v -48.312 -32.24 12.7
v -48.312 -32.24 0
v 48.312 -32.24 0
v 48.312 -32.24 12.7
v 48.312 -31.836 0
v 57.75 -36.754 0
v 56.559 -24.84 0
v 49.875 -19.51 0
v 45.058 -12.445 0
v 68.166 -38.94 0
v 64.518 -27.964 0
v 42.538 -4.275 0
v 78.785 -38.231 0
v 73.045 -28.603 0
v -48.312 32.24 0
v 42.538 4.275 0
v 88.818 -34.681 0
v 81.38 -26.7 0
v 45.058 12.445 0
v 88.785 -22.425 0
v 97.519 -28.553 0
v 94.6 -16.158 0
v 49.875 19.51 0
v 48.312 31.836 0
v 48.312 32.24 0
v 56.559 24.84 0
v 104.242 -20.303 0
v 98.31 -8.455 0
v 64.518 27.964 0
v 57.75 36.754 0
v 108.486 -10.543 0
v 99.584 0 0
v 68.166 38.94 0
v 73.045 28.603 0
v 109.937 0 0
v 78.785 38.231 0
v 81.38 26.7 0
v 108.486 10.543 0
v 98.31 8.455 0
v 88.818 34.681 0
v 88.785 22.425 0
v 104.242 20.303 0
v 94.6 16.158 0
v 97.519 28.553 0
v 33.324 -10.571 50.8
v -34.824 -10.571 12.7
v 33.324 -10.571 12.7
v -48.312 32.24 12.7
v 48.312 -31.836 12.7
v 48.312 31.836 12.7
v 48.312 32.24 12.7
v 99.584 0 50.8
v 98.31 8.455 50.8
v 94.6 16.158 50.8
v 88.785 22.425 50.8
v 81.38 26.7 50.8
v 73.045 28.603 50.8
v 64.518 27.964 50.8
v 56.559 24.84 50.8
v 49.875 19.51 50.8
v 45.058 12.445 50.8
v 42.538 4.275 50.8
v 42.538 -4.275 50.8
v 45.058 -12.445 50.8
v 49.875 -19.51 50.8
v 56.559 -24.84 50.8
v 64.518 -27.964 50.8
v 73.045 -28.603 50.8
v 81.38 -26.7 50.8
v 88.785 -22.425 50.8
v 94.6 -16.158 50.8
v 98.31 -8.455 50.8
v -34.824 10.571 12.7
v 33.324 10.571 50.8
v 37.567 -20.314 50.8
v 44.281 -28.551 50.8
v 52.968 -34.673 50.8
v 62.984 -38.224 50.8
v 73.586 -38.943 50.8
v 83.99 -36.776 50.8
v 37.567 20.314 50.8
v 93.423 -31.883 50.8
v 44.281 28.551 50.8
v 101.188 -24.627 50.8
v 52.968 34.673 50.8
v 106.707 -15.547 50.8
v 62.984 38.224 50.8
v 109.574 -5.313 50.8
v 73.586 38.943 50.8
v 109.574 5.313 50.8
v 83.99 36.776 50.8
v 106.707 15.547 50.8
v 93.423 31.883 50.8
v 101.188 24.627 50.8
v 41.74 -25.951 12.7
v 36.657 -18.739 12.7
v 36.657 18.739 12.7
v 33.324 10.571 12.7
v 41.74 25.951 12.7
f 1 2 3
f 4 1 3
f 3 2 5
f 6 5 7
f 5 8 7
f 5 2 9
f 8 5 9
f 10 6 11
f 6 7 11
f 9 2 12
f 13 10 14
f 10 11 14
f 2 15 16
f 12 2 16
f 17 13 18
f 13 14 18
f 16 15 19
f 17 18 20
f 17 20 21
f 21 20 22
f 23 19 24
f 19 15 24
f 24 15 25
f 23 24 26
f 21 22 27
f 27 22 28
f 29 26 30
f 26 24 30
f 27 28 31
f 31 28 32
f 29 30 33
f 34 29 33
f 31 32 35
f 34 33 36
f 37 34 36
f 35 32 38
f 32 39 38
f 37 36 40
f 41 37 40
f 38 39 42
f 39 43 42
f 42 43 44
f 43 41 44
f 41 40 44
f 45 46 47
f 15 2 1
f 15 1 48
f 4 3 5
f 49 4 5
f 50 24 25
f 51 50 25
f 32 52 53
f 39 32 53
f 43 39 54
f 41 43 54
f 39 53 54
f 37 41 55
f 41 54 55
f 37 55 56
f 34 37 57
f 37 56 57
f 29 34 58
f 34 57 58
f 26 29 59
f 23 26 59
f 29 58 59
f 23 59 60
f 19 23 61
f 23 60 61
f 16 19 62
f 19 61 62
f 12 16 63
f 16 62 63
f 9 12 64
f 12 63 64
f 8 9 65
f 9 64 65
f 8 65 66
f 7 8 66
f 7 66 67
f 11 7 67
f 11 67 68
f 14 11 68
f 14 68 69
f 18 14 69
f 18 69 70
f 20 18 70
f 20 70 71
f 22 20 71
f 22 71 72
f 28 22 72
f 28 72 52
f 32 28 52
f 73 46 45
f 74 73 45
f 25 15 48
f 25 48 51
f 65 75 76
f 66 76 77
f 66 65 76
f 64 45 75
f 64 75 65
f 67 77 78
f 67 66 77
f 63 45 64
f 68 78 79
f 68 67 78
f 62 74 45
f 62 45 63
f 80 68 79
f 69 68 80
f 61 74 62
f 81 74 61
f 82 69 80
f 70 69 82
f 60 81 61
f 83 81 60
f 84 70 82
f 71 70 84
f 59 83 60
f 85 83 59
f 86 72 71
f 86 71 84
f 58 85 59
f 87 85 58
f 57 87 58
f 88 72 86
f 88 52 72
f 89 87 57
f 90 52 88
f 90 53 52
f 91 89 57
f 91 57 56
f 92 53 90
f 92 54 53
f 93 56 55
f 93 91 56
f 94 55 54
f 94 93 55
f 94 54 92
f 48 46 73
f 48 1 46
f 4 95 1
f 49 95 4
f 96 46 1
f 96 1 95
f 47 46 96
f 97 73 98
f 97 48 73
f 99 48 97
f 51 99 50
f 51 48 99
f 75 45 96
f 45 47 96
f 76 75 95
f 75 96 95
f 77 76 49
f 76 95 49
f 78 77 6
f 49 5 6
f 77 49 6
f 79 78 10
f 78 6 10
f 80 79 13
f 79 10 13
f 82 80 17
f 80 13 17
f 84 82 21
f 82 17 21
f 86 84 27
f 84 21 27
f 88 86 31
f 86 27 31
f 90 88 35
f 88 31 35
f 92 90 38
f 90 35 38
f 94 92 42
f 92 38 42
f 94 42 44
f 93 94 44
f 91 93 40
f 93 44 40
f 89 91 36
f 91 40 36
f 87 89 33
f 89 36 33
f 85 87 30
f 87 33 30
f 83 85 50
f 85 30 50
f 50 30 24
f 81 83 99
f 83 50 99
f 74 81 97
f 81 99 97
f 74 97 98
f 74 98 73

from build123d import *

# Parameters (mm, degrees)
F0_W     = 96.6246202588
F0_H     = 64.4804909825
F1_DEPTH = 12.7
F2_R     = 39.0357793673
F3_DEPTH = 50.8
F4_R     = 28.6832588226
F5_DEPTH = 94.996
F7_DEPTH = 38.1
F9_DEPTH = 72.898


with BuildPart() as f1:
    # F0 (on Top) → F1 (new body)
    with BuildSketch(Plane.XY):
        Rectangle(F0_W, F0_H)
    extrude(amount=F1_DEPTH)

    # F2 (on Top) → F3 (join)
    with BuildSketch(Plane.XY):
        with Locations((70.9010735154, 0)):
            Circle(F2_R)
    extrude(amount=F3_DEPTH)

    # F4 (on face) → F5 (cut)
    with BuildSketch(Plane.XY.offset(50.8)):
        with Locations((70.9010735154, 0)):
            Circle(F4_R)
    extrude(amount=-F5_DEPTH, mode=Mode.SUBTRACT)

    # F6 (on face) → F7 (join)
    with BuildSketch(Plane.XY.offset(12.7)):
        with BuildLine():
            Line((33.3239030226, 10.5711081997), (-34.8241180182, 10.5711081997))
            Line((-34.8241180182, 10.5711081997), (-34.8241180182, -10.5711081997))
            Line((-34.8241180182, -10.5711081997), (33.3239030226, -10.5711081997))
            ThreePointArc((33.3239030226, -10.5711081997), (31.8652941481, 0), (33.3239030226, 10.5711081997))
        make_face()
    extrude(amount=F7_DEPTH)

    # F8 (on face) → F9 (cut)
    with BuildSketch(Plane.XZ.offset(10.5711081997)):
        Polygon((-34.8241180182, 12.7), (33.3239030226, 50.8), (-34.8241180182, 50.8), align=None)
    extrude(amount=-F9_DEPTH, mode=Mode.SUBTRACT)


solid = f1.part
